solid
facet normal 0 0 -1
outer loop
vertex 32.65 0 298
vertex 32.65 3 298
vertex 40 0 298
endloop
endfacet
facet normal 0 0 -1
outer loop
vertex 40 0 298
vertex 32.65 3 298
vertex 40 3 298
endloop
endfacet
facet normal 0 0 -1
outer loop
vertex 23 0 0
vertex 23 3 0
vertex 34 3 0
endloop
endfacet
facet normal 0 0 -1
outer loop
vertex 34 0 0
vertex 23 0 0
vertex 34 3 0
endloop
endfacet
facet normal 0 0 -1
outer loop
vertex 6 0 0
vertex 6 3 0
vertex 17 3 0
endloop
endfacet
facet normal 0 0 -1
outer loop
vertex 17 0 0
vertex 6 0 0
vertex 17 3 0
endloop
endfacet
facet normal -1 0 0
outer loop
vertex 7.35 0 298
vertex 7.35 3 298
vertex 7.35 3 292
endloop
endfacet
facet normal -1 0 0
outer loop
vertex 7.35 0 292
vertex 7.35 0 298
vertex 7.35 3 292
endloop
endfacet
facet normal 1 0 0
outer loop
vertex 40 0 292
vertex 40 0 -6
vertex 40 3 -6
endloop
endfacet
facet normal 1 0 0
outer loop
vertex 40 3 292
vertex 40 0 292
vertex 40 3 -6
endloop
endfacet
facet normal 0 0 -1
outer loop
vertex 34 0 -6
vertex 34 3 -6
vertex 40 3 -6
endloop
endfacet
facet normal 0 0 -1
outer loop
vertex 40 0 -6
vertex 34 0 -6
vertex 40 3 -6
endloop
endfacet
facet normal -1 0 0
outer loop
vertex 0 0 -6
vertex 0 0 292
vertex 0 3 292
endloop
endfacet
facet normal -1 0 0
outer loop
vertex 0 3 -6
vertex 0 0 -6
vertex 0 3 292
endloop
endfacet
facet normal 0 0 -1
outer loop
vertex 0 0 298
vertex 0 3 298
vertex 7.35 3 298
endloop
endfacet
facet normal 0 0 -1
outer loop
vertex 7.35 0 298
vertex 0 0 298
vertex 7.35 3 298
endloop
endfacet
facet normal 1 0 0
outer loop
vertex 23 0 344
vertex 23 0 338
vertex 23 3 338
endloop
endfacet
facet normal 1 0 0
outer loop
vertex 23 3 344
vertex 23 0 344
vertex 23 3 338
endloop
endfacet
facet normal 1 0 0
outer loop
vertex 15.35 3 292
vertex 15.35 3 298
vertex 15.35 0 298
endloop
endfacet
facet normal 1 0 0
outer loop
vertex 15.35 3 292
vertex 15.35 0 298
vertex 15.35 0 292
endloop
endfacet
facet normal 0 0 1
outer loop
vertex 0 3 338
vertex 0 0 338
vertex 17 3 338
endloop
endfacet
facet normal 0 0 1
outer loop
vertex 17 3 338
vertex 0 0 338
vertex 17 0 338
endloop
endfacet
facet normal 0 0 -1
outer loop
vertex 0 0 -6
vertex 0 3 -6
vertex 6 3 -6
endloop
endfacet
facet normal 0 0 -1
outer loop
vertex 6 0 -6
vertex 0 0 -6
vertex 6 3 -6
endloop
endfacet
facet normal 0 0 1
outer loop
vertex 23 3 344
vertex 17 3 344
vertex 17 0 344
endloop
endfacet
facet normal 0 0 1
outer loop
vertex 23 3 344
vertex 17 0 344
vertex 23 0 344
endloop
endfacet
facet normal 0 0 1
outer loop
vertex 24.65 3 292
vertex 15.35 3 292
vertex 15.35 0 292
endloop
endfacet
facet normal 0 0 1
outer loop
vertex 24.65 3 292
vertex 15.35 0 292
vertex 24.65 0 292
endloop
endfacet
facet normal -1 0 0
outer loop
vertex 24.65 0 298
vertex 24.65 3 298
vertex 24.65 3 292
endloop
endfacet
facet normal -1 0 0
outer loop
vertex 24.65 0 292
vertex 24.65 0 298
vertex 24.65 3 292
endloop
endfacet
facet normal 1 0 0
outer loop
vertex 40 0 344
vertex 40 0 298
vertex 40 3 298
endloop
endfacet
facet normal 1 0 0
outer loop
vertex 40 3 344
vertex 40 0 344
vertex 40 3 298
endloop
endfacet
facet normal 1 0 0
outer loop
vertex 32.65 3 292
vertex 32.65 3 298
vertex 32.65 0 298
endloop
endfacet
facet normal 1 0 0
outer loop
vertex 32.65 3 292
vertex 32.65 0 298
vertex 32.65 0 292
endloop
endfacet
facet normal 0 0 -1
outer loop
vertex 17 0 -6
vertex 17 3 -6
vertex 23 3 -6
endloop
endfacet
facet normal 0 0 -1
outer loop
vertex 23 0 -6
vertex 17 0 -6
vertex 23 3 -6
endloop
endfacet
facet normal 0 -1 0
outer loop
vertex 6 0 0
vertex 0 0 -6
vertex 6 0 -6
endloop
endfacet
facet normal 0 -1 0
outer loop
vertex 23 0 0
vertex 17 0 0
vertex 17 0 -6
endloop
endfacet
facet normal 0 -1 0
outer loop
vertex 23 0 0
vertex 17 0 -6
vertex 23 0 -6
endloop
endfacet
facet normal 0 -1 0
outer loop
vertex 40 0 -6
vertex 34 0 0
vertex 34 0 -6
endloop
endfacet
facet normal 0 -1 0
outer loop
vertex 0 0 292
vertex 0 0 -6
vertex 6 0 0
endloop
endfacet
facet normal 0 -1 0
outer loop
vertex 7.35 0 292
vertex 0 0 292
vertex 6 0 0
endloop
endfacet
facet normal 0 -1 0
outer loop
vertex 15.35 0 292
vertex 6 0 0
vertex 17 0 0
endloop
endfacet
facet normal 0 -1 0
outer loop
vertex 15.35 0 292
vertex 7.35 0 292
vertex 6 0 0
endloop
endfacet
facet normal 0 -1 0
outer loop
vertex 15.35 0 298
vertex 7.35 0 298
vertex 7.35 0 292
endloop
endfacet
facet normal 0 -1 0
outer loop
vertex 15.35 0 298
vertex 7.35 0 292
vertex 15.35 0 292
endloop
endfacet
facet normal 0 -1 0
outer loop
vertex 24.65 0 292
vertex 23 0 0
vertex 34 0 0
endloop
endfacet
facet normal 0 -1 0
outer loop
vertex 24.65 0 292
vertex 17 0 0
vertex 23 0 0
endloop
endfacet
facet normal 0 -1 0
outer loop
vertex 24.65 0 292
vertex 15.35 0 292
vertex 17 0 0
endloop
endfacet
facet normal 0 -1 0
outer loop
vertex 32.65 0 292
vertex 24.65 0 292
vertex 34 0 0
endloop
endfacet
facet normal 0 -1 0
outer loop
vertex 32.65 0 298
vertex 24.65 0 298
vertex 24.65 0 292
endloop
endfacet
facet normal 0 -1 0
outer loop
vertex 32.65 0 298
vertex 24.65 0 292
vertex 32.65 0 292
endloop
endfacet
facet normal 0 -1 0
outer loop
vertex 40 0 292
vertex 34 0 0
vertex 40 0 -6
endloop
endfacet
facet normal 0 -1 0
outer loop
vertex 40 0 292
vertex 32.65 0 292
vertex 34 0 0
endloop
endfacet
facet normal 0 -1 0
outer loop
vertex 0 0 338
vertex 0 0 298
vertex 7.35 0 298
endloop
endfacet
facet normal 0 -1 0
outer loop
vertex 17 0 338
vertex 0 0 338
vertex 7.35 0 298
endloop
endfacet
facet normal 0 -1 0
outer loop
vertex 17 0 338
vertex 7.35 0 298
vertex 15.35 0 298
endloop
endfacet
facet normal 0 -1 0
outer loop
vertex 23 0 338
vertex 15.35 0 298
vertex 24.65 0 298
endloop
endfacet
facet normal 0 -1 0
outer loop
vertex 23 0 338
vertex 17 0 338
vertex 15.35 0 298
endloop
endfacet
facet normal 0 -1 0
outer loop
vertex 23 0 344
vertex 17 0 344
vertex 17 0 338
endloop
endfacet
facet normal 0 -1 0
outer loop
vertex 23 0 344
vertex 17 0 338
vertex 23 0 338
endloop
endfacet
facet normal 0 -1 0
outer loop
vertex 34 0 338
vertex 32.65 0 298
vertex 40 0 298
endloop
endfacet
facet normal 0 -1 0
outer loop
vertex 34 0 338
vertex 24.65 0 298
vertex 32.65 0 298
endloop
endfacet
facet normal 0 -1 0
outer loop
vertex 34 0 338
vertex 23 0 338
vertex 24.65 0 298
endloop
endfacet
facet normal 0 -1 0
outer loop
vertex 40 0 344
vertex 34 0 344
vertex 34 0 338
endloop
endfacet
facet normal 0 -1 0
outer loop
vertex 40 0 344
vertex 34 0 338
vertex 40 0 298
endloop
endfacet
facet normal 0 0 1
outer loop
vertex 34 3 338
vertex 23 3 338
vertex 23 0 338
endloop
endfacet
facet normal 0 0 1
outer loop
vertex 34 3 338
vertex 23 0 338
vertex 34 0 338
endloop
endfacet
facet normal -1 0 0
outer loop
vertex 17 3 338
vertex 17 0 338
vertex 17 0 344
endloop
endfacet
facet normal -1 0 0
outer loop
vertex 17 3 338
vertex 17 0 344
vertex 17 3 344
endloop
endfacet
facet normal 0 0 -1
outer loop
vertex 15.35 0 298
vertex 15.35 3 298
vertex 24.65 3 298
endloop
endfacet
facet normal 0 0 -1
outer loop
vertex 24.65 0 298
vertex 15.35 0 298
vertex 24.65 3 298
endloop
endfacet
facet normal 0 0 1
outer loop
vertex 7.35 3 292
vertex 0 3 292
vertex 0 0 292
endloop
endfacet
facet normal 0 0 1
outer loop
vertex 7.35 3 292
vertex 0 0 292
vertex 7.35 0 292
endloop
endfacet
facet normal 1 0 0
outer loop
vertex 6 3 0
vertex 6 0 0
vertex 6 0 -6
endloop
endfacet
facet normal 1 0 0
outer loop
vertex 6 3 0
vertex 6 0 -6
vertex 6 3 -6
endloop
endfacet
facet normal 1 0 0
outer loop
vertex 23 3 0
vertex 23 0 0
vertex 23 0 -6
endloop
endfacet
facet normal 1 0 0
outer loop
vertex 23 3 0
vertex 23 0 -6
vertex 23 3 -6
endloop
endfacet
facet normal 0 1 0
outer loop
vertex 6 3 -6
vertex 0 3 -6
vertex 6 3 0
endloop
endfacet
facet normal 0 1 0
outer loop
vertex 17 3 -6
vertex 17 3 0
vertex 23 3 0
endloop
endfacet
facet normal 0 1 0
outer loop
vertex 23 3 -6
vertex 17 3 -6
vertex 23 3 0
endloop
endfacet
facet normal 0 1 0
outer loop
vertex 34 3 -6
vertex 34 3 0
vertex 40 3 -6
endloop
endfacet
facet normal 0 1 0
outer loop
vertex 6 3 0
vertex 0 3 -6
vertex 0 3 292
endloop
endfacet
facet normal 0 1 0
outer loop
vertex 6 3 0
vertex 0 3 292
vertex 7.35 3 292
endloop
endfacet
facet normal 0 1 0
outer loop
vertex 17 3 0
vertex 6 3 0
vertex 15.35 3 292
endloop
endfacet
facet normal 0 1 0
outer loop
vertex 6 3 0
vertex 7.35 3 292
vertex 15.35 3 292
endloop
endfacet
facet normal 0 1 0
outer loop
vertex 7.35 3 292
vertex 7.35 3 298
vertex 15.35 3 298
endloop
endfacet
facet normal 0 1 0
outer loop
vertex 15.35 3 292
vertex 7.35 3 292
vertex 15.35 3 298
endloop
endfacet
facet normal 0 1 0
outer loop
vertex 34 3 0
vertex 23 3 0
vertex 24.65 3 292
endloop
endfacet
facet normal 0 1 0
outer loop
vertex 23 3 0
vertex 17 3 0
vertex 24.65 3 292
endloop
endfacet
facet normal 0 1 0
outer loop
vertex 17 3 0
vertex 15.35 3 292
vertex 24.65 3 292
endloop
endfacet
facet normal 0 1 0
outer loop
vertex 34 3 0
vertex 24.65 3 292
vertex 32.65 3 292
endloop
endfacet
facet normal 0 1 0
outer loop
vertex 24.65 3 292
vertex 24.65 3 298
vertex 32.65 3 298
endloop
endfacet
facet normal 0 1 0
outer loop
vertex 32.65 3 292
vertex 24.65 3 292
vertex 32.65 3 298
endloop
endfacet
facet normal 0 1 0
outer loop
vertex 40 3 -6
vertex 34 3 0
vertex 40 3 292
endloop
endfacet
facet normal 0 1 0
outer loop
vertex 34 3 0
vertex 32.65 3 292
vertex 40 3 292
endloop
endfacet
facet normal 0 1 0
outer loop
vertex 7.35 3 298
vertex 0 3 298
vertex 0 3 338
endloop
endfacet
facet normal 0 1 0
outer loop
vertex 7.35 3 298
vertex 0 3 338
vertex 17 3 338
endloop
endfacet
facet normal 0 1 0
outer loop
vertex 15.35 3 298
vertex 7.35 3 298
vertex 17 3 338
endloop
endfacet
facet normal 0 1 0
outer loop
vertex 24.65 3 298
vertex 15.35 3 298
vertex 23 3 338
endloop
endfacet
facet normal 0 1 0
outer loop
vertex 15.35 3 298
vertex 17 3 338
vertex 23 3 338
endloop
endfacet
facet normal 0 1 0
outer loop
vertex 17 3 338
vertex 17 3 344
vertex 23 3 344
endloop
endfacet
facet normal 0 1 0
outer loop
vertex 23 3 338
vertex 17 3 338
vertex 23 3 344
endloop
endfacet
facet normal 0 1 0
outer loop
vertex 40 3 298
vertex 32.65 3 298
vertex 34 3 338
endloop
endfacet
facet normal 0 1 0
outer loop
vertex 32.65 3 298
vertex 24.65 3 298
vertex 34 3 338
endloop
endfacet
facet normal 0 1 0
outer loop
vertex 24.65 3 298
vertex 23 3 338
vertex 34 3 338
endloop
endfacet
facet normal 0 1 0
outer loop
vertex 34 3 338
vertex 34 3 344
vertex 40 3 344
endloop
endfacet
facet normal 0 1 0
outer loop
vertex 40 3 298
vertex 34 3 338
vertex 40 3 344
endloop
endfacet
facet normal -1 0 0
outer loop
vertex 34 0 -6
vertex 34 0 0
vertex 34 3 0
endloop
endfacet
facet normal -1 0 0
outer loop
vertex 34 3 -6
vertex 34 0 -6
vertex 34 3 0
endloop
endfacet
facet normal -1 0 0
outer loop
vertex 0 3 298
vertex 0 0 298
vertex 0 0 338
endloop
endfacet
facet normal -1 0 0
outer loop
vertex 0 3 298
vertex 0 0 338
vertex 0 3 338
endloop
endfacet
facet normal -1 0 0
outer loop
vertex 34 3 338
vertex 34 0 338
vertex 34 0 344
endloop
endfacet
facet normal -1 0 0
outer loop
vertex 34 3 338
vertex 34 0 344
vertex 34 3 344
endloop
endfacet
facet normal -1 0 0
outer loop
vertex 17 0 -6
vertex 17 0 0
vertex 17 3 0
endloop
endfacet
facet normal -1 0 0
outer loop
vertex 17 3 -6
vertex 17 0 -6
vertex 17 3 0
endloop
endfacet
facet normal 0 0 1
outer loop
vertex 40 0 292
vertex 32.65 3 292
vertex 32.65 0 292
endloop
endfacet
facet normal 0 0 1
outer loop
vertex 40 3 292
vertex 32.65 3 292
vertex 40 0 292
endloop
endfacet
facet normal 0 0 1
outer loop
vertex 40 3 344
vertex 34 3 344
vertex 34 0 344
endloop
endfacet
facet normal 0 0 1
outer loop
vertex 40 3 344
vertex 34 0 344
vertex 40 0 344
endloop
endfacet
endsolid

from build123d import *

# Parameters (mm, degrees)
ESQUISSE1_W             = 40
ESQUISSE1_H             = 3
BOSS_EXTRU_1_DEPTH      = 338
ESQUISSE2_W             = 7.35
ESQUISSE2_H             = 6
ESQUISSE2_W_2           = 9.3
ENL_V_MAT_EXTRU_1_DEPTH = 6
ESQUISSE3_W             = 6
ESQUISSE3_H             = 3
BOSS_EXTRU_2_DEPTH      = 6
ESQUISSE4_W             = 6
ESQUISSE4_H             = 6
ENL_V_MAT_EXTRU_2_DEPTH = 6


with BuildPart() as part:
    # Esquisse1 → Boss.-Extru.1 (new body)
    with BuildSketch(Plane.XY):
        with Locations((20, 1.5)):
            Rectangle(ESQUISSE1_W, ESQUISSE1_H)
    extrude(amount=BOSS_EXTRU_1_DEPTH)

    # Esquisse2 → Enlèv. mat.-Extru.1 (cut)
    with BuildSketch(Plane(origin=(0, 3, 0), x_dir=(1, 0, 0), z_dir=(0, 1, 0))):
        with Locations((3.675, -295)):
            Rectangle(ESQUISSE2_W, ESQUISSE2_H)
        with Locations((20, -295)):
            Rectangle(ESQUISSE2_W_2, ESQUISSE2_H)
        with Locations((36.325, -295)):
            Rectangle(ESQUISSE2_W, ESQUISSE2_H)
    extrude(amount=-ENL_V_MAT_EXTRU_1_DEPTH, mode=Mode.SUBTRACT)

    # Esquisse3 → Boss.-Extru.2 (add)
    with BuildSketch(Plane.XY.offset(338)):
        with Locations((3, 1.5)):
            Rectangle(ESQUISSE3_W, ESQUISSE3_H)
        with Locations((20, 1.5)):
            Rectangle(ESQUISSE3_W, ESQUISSE3_H)
        with Locations((37, 1.5)):
            Rectangle(ESQUISSE3_W, ESQUISSE3_H)
    boss_extru_2 = extrude(amount=BOSS_EXTRU_2_DEPTH)

    # Symétrie1: Boss.-Extru.2 across plane
    add(boss_extru_2.mirror(Plane.XY.offset(169)))

    # Esquisse4 → Enlèv. mat.-Extru.2 (cut)
    with BuildSketch(Plane.XZ):
        with Locations((3, 341)):
            Rectangle(ESQUISSE4_W, ESQUISSE4_H)
    extrude(amount=-ENL_V_MAT_EXTRU_2_DEPTH, mode=Mode.SUBTRACT)


solid = part.part
